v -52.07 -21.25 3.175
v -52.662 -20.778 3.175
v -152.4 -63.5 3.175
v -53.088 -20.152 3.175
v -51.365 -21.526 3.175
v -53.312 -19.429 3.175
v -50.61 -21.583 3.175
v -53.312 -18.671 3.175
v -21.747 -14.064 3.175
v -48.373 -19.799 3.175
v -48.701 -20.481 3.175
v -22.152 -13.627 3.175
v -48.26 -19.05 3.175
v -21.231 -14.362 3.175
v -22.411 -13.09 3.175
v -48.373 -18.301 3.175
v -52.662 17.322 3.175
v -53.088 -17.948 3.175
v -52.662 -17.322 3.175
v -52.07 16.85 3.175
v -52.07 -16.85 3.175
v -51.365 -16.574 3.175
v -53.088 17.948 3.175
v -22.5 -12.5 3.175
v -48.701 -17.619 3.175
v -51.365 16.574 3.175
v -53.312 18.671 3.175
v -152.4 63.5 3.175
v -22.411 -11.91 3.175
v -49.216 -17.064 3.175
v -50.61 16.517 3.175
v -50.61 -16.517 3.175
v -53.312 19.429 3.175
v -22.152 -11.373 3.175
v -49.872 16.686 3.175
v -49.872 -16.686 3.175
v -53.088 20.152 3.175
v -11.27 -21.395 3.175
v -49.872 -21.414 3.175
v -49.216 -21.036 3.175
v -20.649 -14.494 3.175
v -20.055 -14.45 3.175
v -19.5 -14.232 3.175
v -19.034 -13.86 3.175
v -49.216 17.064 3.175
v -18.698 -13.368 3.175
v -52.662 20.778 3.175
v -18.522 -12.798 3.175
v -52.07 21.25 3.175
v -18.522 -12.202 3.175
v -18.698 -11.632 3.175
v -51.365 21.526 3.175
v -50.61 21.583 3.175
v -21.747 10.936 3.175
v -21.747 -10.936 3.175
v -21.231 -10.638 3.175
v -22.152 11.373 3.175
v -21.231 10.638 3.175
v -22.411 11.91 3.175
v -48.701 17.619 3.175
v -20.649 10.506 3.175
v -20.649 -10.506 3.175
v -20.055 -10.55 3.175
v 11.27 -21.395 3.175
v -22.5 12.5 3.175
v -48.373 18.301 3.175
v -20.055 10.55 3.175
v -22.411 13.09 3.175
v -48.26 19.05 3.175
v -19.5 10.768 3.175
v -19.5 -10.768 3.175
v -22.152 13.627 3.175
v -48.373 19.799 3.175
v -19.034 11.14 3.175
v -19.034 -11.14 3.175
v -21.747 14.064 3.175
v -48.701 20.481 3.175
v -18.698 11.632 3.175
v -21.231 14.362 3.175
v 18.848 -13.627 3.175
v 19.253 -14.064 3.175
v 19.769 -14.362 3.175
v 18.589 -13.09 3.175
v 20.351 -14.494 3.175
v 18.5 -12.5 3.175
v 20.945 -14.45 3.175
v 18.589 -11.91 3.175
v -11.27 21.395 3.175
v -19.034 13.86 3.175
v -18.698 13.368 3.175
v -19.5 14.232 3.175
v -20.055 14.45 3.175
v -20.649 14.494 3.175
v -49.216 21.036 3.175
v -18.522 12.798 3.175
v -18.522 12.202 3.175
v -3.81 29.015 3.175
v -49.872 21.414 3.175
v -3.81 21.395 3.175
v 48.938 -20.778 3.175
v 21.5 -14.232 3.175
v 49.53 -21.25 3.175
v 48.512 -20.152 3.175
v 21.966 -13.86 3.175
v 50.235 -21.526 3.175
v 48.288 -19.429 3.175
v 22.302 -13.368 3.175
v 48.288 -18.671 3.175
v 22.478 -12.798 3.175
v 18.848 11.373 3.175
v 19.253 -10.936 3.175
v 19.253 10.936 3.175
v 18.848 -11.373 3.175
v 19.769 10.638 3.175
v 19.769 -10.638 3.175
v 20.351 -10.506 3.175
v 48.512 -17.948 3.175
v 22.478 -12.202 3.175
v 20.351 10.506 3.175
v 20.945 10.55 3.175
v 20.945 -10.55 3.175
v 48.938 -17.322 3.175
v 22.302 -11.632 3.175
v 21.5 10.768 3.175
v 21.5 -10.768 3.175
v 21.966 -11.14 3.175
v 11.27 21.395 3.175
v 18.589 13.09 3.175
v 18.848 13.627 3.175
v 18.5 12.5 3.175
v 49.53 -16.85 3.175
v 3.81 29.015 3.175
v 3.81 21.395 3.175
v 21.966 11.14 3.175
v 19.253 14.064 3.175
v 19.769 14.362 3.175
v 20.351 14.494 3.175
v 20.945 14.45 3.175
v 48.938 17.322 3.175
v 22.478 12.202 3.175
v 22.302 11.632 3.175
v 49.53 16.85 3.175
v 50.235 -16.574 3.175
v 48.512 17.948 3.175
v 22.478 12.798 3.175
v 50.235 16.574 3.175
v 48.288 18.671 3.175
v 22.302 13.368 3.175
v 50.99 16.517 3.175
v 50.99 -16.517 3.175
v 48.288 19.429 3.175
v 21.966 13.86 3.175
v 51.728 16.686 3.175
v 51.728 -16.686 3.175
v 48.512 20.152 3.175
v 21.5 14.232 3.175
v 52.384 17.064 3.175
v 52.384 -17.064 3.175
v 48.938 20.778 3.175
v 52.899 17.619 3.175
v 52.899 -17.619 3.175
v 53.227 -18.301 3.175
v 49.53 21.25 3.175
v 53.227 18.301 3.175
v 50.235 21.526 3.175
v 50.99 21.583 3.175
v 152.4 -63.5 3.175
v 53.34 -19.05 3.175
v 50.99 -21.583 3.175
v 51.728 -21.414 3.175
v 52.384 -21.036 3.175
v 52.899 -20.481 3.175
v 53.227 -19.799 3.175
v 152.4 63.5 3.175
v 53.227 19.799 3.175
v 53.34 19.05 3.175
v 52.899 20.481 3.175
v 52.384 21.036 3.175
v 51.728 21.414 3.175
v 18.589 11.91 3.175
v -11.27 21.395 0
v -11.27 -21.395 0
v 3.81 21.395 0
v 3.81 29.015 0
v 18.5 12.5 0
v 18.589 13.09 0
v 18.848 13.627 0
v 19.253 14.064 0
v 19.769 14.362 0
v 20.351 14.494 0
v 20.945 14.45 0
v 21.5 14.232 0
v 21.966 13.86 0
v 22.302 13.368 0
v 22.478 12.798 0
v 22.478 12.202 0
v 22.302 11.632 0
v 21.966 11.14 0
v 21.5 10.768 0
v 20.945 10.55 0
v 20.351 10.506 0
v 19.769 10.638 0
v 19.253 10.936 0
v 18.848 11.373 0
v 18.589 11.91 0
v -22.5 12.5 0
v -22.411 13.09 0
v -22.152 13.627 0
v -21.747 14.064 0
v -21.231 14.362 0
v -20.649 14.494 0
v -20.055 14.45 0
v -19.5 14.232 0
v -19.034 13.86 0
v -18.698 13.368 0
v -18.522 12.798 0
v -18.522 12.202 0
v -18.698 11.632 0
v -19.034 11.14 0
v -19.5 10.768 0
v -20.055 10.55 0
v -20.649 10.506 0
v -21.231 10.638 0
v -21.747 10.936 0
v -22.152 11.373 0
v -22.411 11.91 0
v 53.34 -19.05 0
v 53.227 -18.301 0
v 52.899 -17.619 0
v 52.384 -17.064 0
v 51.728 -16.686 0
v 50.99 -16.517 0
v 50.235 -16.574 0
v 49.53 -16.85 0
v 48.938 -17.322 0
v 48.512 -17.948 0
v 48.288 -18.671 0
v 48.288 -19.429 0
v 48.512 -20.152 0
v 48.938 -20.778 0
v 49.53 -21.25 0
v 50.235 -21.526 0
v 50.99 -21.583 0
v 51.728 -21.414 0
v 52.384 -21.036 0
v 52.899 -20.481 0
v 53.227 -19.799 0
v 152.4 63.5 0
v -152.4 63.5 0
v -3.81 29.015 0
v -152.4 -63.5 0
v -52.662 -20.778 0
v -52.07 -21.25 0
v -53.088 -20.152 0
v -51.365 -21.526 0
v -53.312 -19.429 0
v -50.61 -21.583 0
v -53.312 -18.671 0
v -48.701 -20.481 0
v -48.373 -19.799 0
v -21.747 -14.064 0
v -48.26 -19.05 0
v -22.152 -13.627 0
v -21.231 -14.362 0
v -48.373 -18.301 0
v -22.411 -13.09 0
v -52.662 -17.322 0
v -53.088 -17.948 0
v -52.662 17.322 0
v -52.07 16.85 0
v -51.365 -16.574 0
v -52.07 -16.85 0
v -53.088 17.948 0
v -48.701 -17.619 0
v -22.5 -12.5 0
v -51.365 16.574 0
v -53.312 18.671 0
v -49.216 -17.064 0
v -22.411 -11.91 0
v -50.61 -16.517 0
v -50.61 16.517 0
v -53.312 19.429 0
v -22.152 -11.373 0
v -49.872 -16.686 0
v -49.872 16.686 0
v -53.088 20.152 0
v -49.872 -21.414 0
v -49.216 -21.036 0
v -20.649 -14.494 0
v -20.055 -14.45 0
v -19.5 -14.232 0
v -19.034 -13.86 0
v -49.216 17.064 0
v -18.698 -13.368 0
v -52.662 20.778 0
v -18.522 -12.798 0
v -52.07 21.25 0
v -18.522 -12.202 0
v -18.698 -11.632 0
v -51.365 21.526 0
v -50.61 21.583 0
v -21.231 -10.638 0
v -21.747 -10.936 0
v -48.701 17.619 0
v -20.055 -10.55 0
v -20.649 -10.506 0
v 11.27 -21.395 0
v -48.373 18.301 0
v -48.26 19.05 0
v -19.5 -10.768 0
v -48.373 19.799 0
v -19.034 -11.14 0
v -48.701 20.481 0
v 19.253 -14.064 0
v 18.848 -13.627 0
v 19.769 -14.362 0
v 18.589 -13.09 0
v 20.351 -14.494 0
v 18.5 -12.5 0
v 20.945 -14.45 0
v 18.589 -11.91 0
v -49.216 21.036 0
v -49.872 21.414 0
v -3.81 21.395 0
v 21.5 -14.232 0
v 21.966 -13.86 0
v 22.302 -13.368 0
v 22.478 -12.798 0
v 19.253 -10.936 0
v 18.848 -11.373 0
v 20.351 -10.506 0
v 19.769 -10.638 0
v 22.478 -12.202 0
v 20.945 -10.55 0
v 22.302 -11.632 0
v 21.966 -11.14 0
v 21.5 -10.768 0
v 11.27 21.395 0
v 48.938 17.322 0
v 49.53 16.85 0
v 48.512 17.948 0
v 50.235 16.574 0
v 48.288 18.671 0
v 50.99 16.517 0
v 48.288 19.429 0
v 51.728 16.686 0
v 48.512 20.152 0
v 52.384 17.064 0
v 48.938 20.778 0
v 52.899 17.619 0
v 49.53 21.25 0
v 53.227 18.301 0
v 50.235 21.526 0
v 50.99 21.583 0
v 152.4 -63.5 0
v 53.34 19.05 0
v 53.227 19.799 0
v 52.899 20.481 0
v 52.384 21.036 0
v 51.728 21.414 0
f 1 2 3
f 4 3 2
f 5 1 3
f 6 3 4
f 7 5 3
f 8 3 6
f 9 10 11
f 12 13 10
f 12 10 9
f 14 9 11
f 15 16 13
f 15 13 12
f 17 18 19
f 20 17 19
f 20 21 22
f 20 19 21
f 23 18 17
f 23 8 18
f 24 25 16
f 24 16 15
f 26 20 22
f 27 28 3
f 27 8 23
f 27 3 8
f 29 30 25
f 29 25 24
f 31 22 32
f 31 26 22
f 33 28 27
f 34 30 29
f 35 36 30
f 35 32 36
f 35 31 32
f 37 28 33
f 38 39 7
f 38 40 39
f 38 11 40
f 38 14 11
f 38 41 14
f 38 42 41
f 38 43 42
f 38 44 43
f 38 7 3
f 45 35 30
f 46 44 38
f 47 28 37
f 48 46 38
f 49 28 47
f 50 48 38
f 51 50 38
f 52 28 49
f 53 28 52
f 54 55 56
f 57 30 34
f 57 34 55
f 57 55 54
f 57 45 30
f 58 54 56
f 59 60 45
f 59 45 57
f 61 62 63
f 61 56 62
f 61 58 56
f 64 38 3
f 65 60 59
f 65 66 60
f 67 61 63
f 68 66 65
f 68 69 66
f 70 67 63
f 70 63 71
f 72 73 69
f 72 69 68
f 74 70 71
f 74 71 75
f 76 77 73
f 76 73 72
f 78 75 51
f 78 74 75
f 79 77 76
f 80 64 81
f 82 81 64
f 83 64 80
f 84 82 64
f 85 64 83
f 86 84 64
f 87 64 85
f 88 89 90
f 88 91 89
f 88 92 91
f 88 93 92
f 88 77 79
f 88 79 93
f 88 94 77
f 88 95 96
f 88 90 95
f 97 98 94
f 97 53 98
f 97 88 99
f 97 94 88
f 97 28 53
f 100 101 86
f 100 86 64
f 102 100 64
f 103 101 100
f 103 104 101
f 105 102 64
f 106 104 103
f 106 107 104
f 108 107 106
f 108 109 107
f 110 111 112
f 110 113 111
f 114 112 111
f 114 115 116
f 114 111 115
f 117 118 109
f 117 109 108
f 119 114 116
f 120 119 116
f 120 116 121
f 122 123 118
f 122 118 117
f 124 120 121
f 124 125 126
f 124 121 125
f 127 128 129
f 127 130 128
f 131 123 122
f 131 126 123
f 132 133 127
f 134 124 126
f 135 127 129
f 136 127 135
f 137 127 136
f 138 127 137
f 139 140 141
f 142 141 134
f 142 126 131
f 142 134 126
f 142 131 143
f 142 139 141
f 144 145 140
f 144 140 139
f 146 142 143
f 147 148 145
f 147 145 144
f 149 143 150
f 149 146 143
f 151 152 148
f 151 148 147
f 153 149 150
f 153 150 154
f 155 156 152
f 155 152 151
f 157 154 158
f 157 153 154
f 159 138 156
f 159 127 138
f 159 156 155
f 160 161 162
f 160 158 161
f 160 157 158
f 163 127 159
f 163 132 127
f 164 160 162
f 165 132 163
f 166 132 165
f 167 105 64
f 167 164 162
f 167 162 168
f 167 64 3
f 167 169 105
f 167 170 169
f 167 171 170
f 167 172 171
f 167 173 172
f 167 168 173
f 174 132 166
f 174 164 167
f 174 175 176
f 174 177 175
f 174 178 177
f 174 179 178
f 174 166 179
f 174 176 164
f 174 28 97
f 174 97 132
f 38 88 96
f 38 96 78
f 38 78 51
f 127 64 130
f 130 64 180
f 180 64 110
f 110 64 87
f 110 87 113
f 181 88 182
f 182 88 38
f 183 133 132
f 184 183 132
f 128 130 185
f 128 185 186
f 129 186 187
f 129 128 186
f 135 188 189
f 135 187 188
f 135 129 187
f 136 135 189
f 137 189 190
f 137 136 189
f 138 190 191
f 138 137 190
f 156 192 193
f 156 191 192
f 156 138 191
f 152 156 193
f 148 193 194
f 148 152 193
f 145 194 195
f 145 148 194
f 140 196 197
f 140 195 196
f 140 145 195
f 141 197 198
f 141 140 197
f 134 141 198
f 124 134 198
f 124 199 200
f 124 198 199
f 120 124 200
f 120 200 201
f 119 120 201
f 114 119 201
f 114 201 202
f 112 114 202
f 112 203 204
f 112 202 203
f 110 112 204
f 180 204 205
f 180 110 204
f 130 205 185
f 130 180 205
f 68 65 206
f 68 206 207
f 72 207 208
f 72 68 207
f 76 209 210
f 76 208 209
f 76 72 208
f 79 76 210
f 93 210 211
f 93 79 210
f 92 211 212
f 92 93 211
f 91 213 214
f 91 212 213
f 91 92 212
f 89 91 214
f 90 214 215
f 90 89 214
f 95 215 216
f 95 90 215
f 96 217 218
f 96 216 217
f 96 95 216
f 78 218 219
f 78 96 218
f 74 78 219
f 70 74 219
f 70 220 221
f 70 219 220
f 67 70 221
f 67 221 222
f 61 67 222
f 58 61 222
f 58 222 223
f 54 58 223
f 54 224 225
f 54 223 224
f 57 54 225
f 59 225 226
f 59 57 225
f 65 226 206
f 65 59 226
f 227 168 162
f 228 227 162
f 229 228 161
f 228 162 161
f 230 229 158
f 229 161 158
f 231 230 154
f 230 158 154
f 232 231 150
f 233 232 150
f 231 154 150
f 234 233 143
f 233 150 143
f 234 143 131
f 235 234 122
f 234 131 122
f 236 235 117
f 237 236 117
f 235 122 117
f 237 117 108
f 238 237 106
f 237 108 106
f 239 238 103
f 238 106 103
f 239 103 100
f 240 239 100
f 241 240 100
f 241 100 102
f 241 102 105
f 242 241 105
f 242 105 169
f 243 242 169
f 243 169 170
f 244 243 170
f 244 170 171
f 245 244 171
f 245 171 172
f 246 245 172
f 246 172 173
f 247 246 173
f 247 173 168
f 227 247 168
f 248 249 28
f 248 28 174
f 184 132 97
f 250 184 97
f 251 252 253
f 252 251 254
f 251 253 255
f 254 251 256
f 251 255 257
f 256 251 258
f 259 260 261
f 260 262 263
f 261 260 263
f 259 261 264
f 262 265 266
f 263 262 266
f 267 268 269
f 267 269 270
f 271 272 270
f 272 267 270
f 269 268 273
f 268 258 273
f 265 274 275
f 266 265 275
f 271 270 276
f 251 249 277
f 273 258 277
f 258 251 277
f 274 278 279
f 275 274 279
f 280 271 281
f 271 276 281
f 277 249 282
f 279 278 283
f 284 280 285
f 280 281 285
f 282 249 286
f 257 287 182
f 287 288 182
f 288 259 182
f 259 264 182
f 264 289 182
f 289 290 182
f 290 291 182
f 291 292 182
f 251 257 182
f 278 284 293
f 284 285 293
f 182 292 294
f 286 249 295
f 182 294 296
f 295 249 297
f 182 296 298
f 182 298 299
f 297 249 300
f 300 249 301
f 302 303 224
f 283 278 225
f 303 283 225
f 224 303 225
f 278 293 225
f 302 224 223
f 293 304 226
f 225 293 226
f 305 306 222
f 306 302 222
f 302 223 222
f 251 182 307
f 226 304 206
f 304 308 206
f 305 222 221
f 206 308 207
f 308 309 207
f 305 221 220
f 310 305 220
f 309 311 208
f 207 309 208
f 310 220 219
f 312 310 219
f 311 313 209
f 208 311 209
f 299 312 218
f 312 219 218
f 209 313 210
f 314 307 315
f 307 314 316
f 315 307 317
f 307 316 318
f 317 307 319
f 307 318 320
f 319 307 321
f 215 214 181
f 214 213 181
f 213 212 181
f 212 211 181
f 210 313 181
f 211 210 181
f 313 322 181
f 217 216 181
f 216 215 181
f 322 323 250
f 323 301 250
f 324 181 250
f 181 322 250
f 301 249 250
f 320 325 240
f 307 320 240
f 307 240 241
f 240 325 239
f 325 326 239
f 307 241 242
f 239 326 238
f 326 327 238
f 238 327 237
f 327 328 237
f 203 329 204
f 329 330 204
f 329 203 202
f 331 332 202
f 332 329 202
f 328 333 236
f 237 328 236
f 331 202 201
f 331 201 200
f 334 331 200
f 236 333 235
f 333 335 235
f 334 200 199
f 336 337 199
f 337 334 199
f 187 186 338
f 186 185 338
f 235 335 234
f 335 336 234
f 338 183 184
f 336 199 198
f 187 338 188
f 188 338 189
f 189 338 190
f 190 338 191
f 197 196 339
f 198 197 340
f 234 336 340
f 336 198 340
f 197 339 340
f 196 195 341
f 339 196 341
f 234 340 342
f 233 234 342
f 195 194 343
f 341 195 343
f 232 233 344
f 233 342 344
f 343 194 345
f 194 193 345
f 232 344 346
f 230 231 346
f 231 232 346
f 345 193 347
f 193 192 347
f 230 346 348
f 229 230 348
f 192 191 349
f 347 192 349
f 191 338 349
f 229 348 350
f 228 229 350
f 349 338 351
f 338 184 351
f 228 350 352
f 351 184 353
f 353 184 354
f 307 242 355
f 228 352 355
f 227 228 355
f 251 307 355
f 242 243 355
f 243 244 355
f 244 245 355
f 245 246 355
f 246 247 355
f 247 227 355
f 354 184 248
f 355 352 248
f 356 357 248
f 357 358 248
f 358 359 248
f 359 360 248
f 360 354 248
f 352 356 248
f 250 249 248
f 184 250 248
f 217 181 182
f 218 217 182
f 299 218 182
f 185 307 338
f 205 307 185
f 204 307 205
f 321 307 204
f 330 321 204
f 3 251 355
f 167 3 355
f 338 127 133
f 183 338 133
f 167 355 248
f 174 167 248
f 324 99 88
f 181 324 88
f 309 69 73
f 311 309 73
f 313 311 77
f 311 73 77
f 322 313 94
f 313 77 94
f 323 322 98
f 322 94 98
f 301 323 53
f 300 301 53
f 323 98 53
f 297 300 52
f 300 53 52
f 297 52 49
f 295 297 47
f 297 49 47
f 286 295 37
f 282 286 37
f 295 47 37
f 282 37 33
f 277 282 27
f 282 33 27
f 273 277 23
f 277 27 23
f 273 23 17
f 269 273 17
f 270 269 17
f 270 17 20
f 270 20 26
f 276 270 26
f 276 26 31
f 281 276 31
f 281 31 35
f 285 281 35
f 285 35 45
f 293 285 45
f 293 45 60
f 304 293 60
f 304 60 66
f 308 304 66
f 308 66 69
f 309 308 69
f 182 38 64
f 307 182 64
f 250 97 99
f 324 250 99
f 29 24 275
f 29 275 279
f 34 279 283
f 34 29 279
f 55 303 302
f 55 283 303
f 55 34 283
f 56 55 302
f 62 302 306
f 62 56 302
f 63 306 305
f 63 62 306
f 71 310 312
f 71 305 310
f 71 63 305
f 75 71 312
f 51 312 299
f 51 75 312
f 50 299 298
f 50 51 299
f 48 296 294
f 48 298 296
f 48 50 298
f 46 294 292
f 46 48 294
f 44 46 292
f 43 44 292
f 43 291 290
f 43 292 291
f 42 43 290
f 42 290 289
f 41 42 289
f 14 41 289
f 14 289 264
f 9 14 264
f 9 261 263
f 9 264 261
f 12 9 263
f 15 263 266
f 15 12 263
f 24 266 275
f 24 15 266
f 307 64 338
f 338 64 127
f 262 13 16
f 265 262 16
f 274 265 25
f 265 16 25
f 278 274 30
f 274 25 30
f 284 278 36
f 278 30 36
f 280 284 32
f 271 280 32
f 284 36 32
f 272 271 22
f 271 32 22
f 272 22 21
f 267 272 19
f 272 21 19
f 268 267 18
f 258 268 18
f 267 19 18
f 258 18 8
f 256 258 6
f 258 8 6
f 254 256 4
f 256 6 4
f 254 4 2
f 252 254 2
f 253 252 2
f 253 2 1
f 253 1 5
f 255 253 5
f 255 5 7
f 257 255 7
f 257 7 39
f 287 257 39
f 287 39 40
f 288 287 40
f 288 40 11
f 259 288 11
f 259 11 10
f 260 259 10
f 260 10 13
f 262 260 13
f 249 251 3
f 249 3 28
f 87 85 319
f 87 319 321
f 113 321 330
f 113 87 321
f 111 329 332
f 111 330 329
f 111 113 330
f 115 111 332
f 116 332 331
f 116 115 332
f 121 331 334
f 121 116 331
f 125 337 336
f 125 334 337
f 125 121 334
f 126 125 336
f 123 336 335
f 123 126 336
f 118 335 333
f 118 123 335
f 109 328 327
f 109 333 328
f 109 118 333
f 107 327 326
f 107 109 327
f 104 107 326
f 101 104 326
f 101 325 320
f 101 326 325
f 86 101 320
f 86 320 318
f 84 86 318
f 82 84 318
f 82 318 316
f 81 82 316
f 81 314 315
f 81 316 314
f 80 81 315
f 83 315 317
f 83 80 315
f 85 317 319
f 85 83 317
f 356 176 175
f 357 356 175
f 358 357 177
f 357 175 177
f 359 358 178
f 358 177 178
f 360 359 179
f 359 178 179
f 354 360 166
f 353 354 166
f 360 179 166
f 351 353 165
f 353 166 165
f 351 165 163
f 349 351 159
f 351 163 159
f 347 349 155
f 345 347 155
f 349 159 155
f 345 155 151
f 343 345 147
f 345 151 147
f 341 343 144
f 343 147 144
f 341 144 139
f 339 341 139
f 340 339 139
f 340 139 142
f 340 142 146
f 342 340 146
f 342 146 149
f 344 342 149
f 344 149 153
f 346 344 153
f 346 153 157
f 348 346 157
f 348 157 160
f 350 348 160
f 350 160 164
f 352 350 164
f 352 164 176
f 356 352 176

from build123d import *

# Parameters (mm, degrees)
SKETCH1_W               = 304.8
SKETCH1_H               = 127
BOSS_EXTRUDE1_DEPTH     = 3.175
SKETCH2_R               = 2.54
CUT_EXTRUDE1_DEPTH      = 166.130526024
CUT_EXTRUDE2_DEPTH      = 166.130526024
CUT_EXTRUDE2_DEPTH_BACK = 166.130526024
SKETCH3_R               = 2


with BuildPart() as part:
    # Sketch1 → Boss-Extrude1 (new body)
    with BuildSketch(Plane.XY):
        Rectangle(SKETCH1_W, SKETCH1_H)
    extrude(amount=BOSS_EXTRUDE1_DEPTH)

    # Sketch2 → Cut-Extrude1 (cut, through all)
    with BuildSketch(Plane.XY.offset(3.175)):
        with Locations((50.8, 19.05)):
            Circle(SKETCH2_R)
        with Locations((50.8, -19.05)):
            Circle(SKETCH2_R)
        with Locations((-50.8, -19.05)):
            Circle(SKETCH2_R)
        with Locations((-50.8, 19.05)):
            Circle(SKETCH2_R)
    extrude(amount=-CUT_EXTRUDE1_DEPTH, mode=Mode.SUBTRACT)

    # Sketch3 → Cut-Extrude2 (cut, two sides: drawn at the far end of the back side and taken through both)
    with BuildSketch(Plane(origin=(0, 0, 0), x_dir=(-1, 0, 0), z_dir=(0, 0, -1)).offset(-CUT_EXTRUDE2_DEPTH_BACK)):
        with Locations((-20.5, 12.5)):
            Circle(SKETCH3_R)
        with Locations((20.5, -12.5)):
            Circle(SKETCH3_R)
        with Locations((20.5, 12.5)):
            Circle(SKETCH3_R)
        with Locations((-20.5, -12.5)):
            Circle(SKETCH3_R)
        Polygon((11.27, 21.395), (11.27, -21.395), (-11.27, -21.395), (-11.27, 21.395), (-3.81, 21.395), (-3.81, 29.015), (3.81, 29.015), (3.81, 21.395), align=None)
    extrude(amount=CUT_EXTRUDE2_DEPTH + CUT_EXTRUDE2_DEPTH_BACK, mode=Mode.SUBTRACT)


solid = part.part
